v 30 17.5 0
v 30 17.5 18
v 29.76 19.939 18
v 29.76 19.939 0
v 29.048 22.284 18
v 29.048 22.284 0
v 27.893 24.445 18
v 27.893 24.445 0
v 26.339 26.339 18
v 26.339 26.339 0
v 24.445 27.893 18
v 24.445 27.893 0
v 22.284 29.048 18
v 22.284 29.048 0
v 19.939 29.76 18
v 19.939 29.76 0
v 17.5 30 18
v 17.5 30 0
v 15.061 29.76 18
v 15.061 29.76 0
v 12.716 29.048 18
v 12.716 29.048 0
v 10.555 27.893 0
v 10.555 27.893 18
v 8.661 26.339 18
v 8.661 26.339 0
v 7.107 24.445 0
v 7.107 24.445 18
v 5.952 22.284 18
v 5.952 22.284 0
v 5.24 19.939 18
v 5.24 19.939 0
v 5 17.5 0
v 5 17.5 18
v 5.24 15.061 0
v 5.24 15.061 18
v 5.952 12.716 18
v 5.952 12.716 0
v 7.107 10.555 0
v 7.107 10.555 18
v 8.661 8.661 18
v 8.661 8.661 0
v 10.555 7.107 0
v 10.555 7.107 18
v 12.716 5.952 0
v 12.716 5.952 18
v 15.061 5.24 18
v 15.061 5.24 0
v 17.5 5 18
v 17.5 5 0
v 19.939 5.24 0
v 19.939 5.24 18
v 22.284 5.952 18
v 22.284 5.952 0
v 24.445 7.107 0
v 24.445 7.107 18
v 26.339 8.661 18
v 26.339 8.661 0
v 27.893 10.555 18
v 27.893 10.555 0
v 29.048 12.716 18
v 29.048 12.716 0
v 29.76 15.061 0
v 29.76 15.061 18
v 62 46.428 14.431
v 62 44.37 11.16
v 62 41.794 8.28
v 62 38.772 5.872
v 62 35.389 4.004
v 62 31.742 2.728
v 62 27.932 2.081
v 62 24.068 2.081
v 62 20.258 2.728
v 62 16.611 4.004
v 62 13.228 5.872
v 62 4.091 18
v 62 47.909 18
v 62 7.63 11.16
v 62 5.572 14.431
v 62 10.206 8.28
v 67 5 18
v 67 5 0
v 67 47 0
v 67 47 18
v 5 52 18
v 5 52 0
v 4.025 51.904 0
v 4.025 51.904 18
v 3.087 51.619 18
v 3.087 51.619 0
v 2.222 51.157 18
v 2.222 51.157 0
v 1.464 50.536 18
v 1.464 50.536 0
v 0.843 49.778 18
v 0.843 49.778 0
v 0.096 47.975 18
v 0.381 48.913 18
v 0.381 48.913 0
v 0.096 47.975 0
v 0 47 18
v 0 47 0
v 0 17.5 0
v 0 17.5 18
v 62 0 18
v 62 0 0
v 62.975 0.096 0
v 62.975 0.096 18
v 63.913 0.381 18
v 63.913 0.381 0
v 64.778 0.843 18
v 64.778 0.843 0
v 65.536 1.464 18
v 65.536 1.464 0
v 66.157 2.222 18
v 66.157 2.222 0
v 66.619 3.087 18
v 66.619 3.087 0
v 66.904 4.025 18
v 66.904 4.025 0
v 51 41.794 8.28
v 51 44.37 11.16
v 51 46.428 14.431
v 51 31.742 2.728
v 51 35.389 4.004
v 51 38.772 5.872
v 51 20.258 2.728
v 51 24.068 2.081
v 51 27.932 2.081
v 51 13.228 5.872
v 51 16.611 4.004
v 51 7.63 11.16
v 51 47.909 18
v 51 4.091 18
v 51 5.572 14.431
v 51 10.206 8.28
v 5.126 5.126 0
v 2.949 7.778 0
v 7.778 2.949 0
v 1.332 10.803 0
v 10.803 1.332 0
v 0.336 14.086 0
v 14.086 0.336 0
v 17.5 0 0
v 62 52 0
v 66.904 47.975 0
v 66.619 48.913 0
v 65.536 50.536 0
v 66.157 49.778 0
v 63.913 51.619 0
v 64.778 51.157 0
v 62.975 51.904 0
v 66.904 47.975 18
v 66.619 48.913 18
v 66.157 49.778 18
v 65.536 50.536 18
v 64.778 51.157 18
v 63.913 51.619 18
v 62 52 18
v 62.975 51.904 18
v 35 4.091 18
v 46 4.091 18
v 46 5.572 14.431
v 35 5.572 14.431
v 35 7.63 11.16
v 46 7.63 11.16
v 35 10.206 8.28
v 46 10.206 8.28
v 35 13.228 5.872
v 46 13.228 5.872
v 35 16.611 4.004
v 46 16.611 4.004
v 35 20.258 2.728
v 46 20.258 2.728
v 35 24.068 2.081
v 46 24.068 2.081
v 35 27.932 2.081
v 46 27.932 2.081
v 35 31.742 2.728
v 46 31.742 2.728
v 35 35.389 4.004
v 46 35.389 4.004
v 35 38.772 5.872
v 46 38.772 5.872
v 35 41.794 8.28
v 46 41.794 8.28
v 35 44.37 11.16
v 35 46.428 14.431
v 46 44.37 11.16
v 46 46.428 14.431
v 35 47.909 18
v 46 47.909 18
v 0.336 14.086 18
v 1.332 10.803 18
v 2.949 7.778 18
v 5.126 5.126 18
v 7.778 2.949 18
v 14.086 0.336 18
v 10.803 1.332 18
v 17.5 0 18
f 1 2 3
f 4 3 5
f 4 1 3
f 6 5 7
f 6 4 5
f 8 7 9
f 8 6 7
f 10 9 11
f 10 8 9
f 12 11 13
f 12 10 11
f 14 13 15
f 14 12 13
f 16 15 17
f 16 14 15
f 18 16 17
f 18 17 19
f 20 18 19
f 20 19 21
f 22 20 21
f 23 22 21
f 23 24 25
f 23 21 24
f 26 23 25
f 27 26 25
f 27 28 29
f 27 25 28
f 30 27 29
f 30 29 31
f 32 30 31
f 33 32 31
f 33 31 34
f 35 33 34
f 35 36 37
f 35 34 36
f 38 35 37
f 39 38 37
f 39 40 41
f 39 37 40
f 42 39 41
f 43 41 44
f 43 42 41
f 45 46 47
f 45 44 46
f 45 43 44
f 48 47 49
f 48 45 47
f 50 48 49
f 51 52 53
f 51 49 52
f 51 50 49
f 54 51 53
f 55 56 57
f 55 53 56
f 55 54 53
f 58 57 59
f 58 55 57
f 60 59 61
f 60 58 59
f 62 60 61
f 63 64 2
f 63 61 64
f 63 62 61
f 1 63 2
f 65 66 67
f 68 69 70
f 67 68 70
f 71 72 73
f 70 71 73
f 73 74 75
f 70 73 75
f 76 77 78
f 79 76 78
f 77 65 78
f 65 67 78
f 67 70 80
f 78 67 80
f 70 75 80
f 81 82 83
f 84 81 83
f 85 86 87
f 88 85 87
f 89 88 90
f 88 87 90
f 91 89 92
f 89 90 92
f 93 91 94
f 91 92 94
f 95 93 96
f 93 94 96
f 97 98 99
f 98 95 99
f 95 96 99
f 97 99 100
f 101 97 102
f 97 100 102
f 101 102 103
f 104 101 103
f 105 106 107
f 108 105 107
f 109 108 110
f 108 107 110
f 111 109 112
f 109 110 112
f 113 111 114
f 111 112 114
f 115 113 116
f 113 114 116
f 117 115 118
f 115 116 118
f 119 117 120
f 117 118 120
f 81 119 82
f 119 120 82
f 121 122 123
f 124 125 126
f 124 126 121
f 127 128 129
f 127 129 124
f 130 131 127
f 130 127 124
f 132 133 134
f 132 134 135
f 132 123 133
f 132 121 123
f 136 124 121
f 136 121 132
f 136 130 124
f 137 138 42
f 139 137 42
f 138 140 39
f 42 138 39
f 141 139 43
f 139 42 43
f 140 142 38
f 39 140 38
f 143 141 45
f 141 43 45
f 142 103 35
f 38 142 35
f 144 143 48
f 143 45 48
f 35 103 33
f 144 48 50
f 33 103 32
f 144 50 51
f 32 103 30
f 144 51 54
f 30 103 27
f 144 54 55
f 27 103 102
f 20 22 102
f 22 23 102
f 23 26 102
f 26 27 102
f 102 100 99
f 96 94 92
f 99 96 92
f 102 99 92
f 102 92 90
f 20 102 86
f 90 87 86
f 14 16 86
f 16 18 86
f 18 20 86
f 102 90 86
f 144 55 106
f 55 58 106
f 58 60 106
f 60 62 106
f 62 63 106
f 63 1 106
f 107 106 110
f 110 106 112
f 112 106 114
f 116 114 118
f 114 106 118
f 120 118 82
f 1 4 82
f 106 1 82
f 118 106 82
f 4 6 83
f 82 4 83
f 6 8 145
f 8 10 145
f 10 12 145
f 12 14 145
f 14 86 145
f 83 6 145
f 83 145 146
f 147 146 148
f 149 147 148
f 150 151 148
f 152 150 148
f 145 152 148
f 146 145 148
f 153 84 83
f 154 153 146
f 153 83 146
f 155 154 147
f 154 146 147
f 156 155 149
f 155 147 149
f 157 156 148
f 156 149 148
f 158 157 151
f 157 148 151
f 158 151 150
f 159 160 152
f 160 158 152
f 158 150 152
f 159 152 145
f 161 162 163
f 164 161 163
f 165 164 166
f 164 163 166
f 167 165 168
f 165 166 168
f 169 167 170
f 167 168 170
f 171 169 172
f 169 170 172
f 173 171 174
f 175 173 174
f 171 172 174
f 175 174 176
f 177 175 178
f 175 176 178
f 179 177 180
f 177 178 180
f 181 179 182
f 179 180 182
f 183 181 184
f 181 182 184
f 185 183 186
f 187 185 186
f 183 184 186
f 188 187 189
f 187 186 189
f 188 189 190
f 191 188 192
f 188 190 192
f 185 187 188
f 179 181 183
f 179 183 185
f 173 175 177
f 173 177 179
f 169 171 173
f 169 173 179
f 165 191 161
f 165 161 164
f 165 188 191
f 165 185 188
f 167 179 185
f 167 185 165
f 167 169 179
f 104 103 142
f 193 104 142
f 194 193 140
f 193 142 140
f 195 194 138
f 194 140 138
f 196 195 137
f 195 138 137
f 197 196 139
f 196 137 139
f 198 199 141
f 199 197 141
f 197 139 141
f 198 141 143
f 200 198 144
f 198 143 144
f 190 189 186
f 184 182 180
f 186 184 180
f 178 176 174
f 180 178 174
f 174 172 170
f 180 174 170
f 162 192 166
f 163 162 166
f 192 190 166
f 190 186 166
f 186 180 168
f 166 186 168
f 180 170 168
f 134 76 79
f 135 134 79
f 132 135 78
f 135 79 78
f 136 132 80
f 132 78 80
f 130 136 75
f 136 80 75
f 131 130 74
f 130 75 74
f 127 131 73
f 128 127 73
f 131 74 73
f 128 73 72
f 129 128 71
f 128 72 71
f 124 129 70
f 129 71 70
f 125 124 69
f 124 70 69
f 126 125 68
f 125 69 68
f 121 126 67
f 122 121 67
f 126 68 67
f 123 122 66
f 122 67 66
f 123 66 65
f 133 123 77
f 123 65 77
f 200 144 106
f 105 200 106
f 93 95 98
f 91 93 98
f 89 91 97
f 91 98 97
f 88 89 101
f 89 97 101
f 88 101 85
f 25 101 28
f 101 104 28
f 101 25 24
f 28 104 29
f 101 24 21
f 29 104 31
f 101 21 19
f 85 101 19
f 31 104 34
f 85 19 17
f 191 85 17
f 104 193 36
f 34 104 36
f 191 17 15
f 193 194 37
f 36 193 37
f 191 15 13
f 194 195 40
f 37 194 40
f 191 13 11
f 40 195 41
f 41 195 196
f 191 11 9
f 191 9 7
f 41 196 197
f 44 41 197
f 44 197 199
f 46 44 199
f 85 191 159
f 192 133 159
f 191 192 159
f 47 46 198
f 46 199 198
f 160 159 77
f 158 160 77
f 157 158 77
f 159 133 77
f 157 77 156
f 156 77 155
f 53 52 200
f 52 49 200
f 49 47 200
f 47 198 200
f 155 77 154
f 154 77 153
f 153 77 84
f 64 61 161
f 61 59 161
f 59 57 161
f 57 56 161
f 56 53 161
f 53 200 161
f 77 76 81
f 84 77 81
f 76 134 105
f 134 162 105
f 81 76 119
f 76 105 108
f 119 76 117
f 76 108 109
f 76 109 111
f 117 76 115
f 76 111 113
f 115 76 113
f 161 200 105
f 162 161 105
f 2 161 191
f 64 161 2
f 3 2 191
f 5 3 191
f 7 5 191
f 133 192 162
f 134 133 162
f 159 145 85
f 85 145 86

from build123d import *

# Parameters (mm, degrees)
F0_R     = 12.5
F1_DEPTH = 25
F2_W     = 11
F2_H     = 23
F4_W     = 82.212326
F4_H     = 18.054354
F5_DEPTH = 52.001


with BuildPart() as f1:
    # F0 (on Top) → F1 (new body)
    with BuildSketch(Plane.XY):
        with BuildLine():
            ThreePointArc((0, 17.5), (5.125631, 5.125631), (17.5, 0))
            Line((17.5, 0), (62, 0))
            ThreePointArc((62, 0), (65.535534, 1.464466), (67, 5))
            Line((67, 5), (67, 47))
            ThreePointArc((67, 47), (65.535534, 50.535534), (62, 52))
            Line((62, 52), (5, 52))
            ThreePointArc((5, 52), (1.464466, 50.535534), (0, 47))
            Line((0, 47), (0, 17.5))
        make_face()
        with Locations((17.5, 17.5)):
            Circle(F0_R, mode=Mode.SUBTRACT)
    extrude(amount=F1_DEPTH)

    # F2 (on face) → F3 (revolve, cut)
    with BuildSketch(Plane.XY.offset(25)):
        with Locations((40.5, 14.5)):
            Rectangle(F2_W, F2_H)
        with Locations((56.5, 14.5)):
            Rectangle(F2_W, F2_H)
    revolve(axis=Axis((40.5, 26, 25), (1, 0, 0)), mode=Mode.SUBTRACT)

    # F4 (on face) → F5 (cut, through all)
    with BuildSketch(Plane.XZ):
        with Locations((41.106163, 27.027177)):
            Rectangle(F4_W, F4_H)
    extrude(amount=-F5_DEPTH, mode=Mode.SUBTRACT)


solid = f1.part
